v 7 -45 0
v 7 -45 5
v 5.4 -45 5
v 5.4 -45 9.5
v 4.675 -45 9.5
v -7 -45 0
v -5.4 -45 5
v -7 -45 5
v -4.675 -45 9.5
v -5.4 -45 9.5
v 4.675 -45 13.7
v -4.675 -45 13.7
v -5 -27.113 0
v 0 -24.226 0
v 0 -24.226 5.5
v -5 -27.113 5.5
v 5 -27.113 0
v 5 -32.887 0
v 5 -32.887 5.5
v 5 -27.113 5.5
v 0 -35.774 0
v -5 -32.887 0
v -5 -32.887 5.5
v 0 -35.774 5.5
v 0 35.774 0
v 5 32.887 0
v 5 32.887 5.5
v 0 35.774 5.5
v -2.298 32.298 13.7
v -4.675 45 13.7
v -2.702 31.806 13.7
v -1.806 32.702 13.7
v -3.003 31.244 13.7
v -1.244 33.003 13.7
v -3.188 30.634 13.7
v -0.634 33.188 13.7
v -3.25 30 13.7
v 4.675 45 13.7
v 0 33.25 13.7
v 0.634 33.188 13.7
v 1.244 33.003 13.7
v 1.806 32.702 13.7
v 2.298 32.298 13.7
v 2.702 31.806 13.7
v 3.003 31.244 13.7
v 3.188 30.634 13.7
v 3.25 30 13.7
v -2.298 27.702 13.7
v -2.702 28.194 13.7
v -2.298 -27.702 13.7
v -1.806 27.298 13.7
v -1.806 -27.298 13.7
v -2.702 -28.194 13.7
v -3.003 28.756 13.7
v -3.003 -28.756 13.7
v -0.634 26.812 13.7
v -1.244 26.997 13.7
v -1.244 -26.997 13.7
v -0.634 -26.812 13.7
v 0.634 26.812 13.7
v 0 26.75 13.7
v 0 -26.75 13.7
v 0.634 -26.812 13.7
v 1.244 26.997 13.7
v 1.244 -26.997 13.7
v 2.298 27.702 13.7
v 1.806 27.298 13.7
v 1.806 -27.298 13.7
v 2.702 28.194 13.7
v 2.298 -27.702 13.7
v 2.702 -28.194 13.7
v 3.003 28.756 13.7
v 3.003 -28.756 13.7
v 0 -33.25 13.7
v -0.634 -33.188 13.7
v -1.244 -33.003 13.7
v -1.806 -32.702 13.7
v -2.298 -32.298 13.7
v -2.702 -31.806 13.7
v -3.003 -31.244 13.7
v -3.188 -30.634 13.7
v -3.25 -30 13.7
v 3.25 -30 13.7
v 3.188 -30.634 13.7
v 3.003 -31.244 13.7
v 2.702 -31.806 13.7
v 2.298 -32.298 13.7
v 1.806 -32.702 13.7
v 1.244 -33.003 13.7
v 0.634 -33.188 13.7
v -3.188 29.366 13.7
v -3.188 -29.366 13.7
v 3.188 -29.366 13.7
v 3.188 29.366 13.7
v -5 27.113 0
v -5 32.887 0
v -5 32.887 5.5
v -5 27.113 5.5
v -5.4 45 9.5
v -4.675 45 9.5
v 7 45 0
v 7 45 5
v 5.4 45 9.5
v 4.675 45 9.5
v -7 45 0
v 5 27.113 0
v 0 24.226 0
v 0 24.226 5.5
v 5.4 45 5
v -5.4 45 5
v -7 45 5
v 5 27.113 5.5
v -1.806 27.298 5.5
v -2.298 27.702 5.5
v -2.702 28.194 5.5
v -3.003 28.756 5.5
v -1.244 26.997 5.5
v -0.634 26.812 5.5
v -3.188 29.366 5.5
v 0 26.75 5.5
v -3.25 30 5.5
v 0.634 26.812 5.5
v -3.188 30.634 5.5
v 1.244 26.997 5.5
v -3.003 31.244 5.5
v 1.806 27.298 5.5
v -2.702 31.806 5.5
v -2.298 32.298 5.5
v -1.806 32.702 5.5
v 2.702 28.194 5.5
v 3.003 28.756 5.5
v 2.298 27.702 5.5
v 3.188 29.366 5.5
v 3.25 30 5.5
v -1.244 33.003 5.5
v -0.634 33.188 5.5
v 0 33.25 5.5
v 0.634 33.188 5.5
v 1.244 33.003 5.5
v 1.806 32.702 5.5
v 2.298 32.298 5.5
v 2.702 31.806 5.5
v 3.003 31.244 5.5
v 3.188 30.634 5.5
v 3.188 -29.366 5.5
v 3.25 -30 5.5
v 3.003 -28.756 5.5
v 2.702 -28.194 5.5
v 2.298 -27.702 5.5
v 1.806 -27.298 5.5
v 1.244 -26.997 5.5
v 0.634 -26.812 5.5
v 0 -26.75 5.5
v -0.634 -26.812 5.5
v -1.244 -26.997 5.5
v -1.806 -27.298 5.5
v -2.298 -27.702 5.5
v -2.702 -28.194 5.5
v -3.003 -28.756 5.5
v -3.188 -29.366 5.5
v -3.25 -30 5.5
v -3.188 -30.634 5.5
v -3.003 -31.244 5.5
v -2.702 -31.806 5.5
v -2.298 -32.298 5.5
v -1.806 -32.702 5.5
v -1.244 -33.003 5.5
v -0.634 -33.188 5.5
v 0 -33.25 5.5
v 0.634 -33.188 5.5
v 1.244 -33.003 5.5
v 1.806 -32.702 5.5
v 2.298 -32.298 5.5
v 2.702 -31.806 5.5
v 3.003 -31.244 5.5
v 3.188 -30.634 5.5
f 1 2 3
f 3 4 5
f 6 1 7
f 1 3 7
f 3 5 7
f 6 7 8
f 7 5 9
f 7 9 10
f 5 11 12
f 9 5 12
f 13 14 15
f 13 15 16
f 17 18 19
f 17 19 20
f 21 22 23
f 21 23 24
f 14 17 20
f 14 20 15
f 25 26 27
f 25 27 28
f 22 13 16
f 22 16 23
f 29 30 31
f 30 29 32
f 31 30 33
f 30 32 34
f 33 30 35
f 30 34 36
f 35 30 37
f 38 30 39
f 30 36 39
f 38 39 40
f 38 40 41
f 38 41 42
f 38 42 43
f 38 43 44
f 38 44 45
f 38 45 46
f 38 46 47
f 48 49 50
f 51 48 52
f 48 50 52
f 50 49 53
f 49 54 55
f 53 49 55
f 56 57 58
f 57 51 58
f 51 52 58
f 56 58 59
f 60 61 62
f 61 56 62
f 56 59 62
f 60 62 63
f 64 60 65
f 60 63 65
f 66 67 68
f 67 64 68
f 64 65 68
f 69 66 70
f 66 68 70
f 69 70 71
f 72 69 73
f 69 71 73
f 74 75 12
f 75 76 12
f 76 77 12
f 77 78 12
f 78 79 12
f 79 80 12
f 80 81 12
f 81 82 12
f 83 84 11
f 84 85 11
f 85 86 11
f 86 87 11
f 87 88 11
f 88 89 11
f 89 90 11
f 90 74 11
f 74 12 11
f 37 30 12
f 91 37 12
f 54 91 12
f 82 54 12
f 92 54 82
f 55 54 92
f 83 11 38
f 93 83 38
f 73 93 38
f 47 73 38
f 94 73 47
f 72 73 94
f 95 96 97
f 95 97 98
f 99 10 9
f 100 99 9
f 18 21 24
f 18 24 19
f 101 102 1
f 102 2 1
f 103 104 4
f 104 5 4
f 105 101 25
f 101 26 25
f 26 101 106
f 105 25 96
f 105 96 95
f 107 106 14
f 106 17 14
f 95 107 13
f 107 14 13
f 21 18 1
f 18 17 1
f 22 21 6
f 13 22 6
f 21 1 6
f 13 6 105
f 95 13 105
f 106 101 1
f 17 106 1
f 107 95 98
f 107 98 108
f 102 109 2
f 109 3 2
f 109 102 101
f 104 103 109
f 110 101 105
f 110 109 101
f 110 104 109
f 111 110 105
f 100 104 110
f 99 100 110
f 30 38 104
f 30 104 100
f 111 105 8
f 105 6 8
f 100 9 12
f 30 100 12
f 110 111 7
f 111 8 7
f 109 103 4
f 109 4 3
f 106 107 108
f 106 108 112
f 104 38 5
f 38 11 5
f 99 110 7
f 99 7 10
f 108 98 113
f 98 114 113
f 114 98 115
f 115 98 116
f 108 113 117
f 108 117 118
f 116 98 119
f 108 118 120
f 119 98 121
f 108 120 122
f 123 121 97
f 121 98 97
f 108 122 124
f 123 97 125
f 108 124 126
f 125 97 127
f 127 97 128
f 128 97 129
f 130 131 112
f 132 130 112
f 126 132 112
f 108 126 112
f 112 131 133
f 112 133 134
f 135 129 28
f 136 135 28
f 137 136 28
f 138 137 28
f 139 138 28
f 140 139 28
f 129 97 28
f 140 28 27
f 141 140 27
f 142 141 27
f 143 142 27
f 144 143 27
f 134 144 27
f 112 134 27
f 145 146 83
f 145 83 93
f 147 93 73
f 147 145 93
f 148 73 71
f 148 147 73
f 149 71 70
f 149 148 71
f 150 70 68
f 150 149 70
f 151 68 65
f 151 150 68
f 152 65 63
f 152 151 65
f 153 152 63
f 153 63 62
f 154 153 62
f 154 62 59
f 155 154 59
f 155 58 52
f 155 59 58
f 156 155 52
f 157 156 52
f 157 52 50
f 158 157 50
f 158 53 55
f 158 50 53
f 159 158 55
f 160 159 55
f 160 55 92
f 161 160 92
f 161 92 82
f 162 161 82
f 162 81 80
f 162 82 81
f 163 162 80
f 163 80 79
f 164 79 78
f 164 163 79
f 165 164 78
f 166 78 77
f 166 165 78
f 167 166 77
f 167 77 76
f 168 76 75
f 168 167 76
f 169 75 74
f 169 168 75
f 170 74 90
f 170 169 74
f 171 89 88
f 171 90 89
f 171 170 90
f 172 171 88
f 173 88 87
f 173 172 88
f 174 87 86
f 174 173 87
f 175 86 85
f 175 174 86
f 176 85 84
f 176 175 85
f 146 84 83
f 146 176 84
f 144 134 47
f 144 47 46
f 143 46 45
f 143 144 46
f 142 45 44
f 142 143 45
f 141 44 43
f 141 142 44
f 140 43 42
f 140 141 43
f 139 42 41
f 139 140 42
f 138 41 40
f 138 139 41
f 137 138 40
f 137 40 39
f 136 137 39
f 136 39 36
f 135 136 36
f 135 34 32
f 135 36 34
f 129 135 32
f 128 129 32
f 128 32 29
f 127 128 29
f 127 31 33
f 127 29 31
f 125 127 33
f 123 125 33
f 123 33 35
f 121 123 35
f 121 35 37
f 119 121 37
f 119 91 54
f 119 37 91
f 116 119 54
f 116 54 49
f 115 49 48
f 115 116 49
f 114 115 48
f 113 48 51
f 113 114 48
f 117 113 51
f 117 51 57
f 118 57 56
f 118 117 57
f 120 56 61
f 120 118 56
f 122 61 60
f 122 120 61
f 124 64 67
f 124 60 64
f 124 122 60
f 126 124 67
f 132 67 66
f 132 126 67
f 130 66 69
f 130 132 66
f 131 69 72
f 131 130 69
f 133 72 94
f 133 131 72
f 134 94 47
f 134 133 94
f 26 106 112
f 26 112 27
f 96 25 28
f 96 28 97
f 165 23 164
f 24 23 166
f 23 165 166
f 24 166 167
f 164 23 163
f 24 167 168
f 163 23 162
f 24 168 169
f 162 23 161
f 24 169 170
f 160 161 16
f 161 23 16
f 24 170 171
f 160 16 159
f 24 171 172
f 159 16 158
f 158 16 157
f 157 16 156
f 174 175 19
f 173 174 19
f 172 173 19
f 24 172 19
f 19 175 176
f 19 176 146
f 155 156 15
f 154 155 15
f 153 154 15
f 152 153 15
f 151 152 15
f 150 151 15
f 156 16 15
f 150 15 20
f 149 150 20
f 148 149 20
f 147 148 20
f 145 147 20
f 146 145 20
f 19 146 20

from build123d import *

# Parameters (mm, degrees)
PAD_DEPTH       = 45
SKETCH001_R     = 3.25
POCKET_DEPTH    = 13.701
POCKET001_DEPTH = 5.5


with BuildPart() as part:
    # Sketch → Pad (new body, symmetric)
    with BuildSketch(Plane.XZ):
        Polygon((-4.675, 13.7), (4.675, 13.7), (4.675, 9.5), (5.4, 9.5), (5.4, 5), (7, 5), (7, 0), (-7, 0), (-7, 5), (-5.4, 5), (-5.4, 9.5), (-4.675, 9.5), align=None)
    extrude(amount=PAD_DEPTH, both=True)

    # Sketch001 → Pocket (cut, through all)
    with BuildSketch(Plane.XY):
        with Locations((0, -30)):
            Circle(SKETCH001_R)
        with Locations((0, 30)):
            Circle(SKETCH001_R)
    extrude(amount=POCKET_DEPTH, mode=Mode.SUBTRACT)

    # Sketch002 → Pocket001 (cut)
    with BuildSketch(Plane.XY):
        Polygon((5, 27.113249), (5, 32.886751), (0, 35.773503), (-5, 32.886751), (-5, 27.113249), (0, 24.226497), align=None)
        Polygon((0, -35.773503), (5, -32.886751), (5, -27.113249), (0, -24.226497), (-5, -27.113249), (-5, -32.886751), align=None)
    extrude(amount=POCKET001_DEPTH, mode=Mode.SUBTRACT)


solid = part.part
